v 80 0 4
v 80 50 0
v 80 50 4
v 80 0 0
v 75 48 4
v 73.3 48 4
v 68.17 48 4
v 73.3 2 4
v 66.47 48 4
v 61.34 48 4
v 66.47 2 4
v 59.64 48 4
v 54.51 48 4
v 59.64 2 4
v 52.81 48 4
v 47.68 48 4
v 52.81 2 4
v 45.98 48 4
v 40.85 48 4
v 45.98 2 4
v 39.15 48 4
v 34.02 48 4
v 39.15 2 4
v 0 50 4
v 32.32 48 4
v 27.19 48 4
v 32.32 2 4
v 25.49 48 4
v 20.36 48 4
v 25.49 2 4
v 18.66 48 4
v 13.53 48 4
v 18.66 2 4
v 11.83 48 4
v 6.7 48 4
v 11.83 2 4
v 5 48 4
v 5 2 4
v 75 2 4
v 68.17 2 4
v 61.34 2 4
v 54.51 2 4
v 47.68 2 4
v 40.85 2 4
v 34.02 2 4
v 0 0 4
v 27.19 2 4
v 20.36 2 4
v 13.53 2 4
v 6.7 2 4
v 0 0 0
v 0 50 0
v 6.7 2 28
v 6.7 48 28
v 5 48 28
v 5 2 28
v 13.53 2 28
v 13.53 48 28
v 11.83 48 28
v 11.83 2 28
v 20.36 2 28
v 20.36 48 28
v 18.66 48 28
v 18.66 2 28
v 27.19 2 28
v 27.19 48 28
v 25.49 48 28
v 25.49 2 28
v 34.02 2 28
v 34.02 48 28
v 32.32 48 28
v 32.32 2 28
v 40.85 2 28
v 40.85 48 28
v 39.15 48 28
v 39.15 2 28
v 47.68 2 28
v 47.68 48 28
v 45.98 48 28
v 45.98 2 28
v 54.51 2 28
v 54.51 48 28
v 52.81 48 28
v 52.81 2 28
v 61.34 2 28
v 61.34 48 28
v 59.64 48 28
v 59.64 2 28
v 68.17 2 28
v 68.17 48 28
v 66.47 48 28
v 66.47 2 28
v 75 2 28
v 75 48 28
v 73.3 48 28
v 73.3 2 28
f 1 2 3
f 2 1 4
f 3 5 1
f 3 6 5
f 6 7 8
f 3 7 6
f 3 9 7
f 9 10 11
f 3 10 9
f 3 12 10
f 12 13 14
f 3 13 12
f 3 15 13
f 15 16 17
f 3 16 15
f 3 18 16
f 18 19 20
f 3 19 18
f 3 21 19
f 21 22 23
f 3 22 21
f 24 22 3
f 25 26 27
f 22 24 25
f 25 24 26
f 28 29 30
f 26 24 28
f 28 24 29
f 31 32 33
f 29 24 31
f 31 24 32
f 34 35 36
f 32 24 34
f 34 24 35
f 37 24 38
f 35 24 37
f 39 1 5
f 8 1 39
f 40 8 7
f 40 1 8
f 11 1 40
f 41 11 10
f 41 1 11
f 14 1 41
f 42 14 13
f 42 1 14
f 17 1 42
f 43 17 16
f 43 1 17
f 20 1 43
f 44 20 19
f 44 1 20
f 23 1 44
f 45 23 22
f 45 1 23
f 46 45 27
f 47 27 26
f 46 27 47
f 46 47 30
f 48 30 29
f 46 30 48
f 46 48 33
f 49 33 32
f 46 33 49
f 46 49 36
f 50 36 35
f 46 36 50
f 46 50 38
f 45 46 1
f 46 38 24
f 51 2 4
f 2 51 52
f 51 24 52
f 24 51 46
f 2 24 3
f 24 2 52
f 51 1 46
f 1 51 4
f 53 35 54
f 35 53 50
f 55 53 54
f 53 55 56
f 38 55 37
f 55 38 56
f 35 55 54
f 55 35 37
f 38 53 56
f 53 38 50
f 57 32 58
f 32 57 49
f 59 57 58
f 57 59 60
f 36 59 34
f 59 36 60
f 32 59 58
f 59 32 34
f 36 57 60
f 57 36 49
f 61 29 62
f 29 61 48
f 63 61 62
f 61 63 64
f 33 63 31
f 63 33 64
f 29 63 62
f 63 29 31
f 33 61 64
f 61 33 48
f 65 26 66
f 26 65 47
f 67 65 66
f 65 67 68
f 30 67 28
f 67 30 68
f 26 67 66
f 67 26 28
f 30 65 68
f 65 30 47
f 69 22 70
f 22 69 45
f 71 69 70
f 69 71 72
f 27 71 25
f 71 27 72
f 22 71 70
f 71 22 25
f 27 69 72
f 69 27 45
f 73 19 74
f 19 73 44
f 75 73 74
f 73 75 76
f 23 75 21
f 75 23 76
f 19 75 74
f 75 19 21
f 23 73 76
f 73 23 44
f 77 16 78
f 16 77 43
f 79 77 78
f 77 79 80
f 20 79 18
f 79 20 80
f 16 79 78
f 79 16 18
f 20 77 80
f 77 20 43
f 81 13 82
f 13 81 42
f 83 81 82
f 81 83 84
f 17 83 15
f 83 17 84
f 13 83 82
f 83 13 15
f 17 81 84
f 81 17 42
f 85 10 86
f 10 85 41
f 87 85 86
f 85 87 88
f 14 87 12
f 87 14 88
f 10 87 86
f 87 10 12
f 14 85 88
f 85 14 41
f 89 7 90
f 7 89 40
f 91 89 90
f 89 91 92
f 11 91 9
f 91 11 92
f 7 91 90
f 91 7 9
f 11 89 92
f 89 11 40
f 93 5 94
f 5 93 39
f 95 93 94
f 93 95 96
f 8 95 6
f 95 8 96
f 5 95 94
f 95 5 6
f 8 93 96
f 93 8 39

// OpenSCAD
union() {
	translate(v = [40.0, 25.0, 2.0]) {
		cube(center = true, size = [80.0, 50.0, 4.0]);
	}
	translate(v = [5.85, 25.0, 16.0]) {
		cube(center = true, size = [1.7, 46.0, 24.0]);
	}
	translate(v = [12.68, 25.0, 16.0]) {
		cube(center = true, size = [1.7, 46.0, 24.0]);
	}
	translate(v = [19.51, 25.0, 16.0]) {
		cube(center = true, size = [1.7, 46.0, 24.0]);
	}
	translate(v = [26.34, 25.0, 16.0]) {
		cube(center = true, size = [1.7, 46.0, 24.0]);
	}
	translate(v = [33.17, 25.0, 16.0]) {
		cube(center = true, size = [1.7, 46.0, 24.0]);
	}
	translate(v = [40.0, 25.0, 16.0]) {
		cube(center = true, size = [1.7, 46.0, 24.0]);
	}
	translate(v = [46.83, 25.0, 16.0]) {
		cube(center = true, size = [1.7, 46.0, 24.0]);
	}
	translate(v = [53.66, 25.0, 16.0]) {
		cube(center = true, size = [1.7, 46.0, 24.0]);
	}
	translate(v = [60.49, 25.0, 16.0]) {
		cube(center = true, size = [1.7, 46.0, 24.0]);
	}
	translate(v = [67.32, 25.0, 16.0]) {
		cube(center = true, size = [1.7, 46.0, 24.0]);
	}
	translate(v = [74.15, 25.0, 16.0]) {
		cube(center = true, size = [1.7, 46.0, 24.0]);
	}
}
